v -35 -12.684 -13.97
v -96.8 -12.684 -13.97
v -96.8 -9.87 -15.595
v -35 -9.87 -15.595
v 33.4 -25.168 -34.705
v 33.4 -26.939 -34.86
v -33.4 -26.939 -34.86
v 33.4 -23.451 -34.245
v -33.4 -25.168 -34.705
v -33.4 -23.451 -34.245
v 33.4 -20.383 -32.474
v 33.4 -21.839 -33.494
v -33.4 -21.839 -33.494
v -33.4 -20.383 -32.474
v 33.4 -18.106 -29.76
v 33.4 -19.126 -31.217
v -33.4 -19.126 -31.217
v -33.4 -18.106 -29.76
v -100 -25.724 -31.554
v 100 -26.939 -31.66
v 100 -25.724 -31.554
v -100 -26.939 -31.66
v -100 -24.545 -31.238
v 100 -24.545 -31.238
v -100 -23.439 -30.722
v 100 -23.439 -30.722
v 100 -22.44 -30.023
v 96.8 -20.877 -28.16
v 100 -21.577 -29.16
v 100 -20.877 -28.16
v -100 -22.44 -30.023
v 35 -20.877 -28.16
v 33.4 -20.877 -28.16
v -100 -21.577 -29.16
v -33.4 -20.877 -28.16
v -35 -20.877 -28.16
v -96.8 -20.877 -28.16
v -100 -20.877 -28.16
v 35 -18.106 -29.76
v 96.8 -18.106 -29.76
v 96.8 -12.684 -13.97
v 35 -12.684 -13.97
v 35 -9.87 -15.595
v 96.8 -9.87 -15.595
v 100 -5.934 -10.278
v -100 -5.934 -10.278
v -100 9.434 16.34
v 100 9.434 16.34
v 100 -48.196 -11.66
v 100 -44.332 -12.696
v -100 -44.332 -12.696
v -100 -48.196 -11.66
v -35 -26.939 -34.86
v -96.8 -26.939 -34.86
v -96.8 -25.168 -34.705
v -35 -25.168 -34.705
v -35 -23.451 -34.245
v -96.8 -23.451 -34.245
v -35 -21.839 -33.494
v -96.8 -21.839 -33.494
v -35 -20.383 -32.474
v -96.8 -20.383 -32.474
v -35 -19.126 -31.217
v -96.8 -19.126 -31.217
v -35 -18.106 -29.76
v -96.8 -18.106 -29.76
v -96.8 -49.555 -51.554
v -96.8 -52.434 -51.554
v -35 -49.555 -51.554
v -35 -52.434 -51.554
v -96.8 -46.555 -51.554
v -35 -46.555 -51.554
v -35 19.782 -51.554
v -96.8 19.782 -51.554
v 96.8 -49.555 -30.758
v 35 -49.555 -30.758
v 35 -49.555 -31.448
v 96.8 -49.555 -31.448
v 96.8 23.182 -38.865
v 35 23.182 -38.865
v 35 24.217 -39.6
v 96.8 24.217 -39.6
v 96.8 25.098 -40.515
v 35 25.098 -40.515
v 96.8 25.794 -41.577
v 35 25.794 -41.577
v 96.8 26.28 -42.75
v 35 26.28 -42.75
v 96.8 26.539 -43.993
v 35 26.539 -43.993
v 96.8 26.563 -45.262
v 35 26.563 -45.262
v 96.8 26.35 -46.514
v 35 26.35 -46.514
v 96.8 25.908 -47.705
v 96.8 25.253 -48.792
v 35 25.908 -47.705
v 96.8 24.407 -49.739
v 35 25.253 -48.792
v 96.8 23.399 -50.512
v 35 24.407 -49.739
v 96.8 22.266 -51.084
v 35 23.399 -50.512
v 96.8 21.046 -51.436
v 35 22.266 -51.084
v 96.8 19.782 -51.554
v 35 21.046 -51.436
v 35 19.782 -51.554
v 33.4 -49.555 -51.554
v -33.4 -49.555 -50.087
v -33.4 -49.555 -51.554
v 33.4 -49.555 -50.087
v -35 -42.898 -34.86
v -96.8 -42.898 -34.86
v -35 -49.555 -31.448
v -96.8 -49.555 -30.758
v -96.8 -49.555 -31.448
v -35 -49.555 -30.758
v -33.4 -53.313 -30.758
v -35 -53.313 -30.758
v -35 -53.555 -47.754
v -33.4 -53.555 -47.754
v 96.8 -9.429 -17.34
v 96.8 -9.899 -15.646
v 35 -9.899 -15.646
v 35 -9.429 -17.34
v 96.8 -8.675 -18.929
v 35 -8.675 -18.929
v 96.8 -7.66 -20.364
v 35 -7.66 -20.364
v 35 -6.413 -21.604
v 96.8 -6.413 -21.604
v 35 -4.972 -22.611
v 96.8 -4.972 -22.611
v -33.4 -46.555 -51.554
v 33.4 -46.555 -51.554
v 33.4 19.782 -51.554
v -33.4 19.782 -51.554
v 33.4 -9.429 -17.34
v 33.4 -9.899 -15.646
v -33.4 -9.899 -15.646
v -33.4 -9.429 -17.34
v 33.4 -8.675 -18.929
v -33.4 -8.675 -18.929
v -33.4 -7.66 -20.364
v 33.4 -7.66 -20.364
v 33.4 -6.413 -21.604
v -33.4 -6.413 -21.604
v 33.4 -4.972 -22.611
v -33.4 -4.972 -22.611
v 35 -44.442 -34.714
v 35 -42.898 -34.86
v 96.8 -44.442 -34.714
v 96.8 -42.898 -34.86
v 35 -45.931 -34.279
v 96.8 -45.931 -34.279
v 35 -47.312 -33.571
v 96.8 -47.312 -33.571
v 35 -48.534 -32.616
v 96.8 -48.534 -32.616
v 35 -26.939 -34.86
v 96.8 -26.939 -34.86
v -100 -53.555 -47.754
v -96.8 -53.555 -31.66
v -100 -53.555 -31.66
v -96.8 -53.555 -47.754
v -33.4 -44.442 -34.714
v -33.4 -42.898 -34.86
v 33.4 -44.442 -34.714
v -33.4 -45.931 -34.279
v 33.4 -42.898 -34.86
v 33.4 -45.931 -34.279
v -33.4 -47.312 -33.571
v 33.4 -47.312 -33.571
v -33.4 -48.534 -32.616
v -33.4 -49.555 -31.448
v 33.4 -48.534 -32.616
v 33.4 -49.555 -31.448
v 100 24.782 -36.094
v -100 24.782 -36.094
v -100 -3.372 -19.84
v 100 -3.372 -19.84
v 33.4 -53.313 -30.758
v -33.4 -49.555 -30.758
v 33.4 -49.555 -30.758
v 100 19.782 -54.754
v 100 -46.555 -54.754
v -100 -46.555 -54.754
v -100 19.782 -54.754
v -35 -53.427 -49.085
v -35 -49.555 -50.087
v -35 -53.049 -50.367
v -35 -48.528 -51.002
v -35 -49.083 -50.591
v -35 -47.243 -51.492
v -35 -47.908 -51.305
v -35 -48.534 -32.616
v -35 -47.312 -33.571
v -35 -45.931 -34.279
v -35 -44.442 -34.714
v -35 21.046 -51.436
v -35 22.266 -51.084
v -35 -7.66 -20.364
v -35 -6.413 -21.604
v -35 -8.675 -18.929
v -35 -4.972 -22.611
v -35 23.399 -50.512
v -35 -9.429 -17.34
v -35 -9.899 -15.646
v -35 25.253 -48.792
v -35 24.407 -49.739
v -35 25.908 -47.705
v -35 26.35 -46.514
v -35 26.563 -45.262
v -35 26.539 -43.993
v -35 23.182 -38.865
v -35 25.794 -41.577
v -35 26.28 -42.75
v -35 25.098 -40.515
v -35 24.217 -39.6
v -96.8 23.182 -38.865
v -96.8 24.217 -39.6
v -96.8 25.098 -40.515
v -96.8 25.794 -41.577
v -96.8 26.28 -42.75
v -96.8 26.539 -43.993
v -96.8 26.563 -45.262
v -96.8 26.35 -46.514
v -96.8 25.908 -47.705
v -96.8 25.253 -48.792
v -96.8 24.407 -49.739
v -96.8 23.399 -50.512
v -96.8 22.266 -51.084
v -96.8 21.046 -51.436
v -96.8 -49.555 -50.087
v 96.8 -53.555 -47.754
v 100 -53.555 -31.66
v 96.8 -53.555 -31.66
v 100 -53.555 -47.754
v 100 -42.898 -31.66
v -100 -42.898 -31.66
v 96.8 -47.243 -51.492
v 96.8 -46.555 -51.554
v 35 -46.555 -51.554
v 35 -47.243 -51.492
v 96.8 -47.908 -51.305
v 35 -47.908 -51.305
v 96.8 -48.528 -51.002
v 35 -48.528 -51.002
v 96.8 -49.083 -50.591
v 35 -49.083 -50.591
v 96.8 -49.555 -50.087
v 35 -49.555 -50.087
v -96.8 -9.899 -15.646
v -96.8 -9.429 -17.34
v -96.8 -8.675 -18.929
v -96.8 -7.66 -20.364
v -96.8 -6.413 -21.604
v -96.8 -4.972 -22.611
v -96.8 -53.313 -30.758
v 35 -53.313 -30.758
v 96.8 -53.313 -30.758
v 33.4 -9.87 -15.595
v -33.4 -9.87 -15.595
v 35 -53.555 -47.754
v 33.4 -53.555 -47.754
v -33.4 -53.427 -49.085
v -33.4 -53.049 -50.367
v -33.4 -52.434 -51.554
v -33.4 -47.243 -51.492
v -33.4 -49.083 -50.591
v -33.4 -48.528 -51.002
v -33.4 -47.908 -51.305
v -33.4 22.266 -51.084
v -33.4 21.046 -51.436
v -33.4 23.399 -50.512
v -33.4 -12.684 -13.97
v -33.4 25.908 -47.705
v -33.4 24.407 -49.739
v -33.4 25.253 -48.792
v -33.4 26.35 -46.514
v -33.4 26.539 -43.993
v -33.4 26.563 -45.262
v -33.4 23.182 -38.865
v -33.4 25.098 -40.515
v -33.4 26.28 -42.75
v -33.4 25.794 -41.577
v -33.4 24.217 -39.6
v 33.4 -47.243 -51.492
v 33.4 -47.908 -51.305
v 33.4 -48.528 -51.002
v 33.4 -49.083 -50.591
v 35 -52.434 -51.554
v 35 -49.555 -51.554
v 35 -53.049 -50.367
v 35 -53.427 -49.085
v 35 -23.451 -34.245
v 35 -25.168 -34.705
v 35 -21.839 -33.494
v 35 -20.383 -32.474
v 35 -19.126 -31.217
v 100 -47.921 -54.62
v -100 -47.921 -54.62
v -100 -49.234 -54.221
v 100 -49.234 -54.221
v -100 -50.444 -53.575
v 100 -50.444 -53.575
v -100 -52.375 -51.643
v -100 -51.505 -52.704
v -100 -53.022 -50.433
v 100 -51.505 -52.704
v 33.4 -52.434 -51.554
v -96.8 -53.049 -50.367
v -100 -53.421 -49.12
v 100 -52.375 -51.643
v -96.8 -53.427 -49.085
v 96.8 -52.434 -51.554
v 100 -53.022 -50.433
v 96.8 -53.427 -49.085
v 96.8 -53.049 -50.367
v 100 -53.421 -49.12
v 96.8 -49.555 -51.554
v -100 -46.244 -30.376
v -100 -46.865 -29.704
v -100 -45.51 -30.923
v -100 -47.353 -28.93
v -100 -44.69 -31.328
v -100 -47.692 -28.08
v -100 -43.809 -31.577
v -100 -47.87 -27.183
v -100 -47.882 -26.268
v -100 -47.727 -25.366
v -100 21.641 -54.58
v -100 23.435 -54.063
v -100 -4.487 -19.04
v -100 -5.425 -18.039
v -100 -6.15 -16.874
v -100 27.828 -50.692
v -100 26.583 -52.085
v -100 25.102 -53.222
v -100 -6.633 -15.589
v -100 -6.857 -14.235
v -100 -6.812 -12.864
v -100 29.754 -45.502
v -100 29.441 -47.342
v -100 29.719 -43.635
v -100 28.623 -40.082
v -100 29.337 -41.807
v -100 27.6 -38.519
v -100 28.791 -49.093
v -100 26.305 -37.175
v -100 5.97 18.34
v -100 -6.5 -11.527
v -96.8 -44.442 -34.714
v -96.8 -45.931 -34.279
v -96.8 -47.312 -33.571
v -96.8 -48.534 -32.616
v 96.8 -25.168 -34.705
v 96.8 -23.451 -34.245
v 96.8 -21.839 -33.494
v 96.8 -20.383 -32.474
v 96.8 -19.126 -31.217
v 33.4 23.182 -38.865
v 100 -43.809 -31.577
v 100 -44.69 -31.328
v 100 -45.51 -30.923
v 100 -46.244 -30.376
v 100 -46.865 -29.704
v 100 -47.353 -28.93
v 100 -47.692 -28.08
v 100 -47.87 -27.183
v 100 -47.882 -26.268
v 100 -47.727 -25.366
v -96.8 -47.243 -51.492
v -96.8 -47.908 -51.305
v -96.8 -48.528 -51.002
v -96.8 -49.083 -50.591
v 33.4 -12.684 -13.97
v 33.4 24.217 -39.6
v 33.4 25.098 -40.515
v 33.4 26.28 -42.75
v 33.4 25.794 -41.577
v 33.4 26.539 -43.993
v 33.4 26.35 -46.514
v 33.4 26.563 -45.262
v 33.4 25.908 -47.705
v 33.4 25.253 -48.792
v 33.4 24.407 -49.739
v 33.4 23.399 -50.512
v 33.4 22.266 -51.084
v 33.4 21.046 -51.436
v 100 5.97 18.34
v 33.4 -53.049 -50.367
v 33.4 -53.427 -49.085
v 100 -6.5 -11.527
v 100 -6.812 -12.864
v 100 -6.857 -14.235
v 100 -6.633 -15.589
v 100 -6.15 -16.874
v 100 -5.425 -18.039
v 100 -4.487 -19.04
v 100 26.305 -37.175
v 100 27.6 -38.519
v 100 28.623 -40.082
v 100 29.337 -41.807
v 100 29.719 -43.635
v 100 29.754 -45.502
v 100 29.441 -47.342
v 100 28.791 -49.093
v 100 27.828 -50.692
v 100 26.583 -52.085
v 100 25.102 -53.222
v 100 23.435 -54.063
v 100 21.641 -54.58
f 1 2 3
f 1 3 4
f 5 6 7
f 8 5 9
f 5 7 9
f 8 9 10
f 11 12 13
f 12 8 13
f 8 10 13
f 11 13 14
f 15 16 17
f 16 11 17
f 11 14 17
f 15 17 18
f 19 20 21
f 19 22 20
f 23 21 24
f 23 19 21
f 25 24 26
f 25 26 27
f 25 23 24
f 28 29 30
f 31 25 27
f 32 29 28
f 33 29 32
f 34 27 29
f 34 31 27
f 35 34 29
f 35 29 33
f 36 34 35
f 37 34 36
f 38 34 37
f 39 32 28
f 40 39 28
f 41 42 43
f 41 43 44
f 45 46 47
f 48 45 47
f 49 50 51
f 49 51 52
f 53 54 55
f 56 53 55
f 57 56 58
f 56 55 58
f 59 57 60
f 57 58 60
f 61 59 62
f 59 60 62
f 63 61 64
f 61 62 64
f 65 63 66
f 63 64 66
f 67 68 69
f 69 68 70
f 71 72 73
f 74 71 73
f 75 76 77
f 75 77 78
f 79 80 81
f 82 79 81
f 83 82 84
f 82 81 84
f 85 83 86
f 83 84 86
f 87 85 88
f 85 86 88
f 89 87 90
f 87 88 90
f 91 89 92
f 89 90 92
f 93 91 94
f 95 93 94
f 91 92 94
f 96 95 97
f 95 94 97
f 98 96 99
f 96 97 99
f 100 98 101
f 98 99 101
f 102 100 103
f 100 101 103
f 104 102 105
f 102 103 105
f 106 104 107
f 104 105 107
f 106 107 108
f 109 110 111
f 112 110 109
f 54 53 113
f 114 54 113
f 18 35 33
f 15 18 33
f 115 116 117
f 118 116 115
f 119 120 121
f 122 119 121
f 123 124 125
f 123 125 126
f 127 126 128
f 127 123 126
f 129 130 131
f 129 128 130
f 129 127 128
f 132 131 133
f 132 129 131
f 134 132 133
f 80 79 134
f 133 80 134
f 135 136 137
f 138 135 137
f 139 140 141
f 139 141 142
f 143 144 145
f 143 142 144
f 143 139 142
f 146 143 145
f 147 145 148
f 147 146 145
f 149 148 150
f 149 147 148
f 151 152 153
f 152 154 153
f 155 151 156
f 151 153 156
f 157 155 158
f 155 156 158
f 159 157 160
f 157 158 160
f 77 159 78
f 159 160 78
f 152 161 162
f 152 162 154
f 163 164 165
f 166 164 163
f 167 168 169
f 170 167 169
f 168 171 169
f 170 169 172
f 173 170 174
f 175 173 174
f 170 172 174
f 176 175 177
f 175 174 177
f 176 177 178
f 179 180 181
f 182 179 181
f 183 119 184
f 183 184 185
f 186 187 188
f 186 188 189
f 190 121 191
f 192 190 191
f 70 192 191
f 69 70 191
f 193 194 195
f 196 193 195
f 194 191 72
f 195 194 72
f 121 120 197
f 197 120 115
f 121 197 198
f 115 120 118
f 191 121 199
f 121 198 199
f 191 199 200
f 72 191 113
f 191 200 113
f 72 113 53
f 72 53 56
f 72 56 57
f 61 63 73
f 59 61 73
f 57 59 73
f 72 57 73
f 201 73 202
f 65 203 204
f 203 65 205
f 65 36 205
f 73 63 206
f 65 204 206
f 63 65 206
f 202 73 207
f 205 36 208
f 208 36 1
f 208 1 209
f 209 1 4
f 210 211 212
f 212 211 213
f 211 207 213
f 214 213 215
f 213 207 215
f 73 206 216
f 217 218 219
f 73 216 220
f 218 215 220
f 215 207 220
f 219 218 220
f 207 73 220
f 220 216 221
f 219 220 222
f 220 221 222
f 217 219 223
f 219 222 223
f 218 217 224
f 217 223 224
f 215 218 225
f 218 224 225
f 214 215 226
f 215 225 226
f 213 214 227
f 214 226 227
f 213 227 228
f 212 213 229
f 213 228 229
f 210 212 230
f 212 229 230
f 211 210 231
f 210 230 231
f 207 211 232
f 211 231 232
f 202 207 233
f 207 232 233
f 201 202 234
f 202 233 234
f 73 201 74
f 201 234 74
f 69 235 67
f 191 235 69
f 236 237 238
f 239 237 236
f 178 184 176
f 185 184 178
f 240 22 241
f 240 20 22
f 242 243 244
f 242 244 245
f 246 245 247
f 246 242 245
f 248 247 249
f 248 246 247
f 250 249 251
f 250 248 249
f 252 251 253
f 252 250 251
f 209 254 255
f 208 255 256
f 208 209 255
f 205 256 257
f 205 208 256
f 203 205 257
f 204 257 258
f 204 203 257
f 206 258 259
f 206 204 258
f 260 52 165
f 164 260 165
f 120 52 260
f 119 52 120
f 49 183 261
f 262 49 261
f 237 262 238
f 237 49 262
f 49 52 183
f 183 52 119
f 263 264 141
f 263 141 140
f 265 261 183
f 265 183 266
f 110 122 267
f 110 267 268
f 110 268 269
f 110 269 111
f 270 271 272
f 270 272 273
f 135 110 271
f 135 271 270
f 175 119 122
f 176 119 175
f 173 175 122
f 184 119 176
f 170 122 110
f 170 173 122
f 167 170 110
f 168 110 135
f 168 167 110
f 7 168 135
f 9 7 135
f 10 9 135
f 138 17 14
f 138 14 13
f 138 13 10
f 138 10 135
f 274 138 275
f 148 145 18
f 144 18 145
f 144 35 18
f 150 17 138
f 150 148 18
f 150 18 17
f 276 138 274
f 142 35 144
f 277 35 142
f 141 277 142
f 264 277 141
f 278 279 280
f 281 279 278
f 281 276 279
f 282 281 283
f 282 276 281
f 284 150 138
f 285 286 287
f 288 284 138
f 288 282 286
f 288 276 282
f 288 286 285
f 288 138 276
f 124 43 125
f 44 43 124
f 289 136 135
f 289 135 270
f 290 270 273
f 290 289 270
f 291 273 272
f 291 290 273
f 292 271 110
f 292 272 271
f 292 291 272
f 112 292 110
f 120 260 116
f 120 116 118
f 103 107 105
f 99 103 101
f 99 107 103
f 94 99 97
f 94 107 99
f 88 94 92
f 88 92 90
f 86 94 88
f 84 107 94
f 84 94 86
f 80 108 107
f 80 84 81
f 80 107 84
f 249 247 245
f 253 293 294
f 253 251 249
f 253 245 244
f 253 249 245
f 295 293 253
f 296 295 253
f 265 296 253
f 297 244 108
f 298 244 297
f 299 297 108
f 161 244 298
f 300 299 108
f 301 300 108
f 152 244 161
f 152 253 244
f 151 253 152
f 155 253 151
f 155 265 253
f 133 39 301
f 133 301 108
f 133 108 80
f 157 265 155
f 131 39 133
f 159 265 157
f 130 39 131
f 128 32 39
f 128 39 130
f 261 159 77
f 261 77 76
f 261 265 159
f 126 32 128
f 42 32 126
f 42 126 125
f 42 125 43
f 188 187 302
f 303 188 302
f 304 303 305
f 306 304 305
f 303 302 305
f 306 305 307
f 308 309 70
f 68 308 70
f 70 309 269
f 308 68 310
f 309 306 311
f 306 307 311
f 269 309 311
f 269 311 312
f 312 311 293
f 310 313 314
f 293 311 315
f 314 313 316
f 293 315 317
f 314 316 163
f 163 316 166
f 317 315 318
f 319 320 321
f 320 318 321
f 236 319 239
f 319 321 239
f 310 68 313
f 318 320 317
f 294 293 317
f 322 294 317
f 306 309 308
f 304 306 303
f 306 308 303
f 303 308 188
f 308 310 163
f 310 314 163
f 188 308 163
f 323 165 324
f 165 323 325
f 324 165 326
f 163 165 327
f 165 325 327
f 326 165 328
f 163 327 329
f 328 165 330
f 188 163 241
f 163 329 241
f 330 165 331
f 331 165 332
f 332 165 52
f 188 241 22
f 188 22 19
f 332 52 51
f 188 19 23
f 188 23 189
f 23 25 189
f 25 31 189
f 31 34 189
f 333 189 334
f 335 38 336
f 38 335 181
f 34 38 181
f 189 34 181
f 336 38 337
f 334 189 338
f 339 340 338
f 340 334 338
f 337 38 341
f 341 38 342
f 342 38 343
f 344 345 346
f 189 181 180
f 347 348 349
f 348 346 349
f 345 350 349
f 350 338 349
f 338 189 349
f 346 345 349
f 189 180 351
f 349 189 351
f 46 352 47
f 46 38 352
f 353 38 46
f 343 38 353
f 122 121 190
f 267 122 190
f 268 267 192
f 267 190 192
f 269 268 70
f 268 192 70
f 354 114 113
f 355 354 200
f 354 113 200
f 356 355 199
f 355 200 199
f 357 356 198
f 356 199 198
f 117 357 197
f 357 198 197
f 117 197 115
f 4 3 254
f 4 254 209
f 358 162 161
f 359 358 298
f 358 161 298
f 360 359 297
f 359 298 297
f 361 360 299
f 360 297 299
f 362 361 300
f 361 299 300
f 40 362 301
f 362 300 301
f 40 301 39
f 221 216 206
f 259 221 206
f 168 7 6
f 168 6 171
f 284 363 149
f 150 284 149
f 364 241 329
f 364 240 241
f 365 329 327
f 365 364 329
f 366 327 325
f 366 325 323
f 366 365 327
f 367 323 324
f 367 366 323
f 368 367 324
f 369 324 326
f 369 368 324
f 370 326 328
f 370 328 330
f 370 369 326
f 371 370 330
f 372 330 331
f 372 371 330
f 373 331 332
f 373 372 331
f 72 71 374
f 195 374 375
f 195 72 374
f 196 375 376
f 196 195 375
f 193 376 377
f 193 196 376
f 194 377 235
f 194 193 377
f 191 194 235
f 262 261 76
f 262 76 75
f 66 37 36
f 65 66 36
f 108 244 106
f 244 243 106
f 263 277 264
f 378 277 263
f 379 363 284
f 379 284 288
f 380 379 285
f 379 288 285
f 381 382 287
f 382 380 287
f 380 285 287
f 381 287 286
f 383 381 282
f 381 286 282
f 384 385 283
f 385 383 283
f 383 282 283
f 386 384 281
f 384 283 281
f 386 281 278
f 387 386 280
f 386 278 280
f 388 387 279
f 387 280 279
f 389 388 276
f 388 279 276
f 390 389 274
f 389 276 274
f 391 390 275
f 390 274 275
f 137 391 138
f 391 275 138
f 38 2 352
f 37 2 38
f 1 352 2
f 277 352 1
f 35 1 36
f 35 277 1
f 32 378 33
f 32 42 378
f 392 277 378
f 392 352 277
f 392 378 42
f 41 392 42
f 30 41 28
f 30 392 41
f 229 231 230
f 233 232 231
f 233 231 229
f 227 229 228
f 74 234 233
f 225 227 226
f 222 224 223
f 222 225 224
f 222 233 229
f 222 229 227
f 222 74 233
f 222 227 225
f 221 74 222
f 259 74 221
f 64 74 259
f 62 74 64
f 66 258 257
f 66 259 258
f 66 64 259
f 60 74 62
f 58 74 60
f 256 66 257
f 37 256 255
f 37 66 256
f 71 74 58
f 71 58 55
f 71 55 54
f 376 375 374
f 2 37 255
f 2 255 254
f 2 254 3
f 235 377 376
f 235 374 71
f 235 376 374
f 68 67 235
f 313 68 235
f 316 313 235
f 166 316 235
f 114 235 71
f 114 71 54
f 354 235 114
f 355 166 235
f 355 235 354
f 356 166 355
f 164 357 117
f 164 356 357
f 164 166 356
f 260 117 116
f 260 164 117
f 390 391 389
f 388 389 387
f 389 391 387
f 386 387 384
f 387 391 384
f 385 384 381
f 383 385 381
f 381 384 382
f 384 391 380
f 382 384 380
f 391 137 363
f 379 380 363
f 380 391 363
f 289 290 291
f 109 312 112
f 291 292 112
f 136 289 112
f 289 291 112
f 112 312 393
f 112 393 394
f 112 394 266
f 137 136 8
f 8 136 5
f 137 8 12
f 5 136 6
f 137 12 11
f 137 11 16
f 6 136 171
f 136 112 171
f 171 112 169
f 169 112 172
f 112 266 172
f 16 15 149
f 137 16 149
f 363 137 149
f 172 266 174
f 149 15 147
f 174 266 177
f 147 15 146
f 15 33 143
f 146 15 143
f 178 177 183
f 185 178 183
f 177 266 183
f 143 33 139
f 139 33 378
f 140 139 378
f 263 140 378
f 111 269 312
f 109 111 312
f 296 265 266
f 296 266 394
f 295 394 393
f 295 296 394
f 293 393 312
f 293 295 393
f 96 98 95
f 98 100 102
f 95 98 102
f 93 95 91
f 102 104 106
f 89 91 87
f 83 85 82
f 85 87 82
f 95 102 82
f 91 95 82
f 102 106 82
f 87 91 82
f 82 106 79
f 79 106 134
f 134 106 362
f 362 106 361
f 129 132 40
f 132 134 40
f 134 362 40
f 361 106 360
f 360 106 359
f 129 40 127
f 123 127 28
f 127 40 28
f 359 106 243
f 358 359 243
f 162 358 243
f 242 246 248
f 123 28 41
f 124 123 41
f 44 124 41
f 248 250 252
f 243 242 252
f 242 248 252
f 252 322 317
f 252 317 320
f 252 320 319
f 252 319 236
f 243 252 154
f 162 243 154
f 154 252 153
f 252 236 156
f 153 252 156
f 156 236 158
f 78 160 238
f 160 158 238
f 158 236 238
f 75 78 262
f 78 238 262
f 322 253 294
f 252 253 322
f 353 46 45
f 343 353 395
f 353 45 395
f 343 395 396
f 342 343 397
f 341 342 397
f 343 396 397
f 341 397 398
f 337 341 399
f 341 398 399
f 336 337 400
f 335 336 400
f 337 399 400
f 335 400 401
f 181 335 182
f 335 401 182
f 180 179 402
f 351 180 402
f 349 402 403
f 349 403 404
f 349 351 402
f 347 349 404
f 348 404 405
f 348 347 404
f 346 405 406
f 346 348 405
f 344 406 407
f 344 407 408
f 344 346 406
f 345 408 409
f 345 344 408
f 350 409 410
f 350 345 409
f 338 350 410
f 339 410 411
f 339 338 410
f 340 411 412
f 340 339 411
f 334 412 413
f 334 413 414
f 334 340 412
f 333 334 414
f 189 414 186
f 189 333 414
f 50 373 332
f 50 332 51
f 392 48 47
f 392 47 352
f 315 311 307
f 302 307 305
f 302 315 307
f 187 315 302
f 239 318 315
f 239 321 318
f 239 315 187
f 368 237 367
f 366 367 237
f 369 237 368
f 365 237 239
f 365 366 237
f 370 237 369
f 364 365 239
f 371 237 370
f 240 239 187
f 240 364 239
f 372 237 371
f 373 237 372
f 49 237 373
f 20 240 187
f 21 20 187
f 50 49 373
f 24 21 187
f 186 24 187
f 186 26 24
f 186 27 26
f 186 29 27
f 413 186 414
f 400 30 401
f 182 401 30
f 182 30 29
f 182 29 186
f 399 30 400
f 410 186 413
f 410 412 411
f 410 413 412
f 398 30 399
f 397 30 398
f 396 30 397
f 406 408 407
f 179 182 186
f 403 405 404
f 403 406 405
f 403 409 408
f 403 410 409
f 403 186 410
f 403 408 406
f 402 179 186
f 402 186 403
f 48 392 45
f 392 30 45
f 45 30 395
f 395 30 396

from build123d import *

# Parameters (mm, degrees)
F1_DEPTH    = 100
F2_R        = 7
F3_T1_DEPTH = 386.6025403784
F4_T        = -3.2
F5_W        = 193.6
F5_H        = 20.7961232061
F6_DEPTH    = 4
F9_DEPTH    = 1.6
F10_W       = 61.8
F10_H       = 16.3858774256
F10_W_2     = 66.8
F11_DEPTH   = 3.25


# Not quite as in the source:
# - a fillet or chamfer that OpenCascade refuses, or shapes differently, is made with other operations: its cross-section is extruded or revolved along the edge and cut away or added
# - a pattern or mirror of a feature is missing from the dataset's text; its kind, count and spacing are read off the source's solid


with BuildPart() as f1:
    # F0 (on Right) → F1 (new body, symmetric)
    with BuildSketch(Plane.YZ):
        with BuildLine():
            ThreePointArc((-42.8978583449, -31.6602540378), (-46.8646250463, -29.7040611829), (-47.7274874763, -25.3661588123))
            Line((-47.7274874763, -25.3661588123), (-44.3324027769, -12.6955302183))
            Line((-44.3324027769, -12.6955302183), (-48.1961060821, -11.6602540378))
            Line((-48.1961060821, -11.6602540378), (-53.5550899307, -31.6602540378))
            Line((-53.5550899307, -31.6602540378), (-53.5550899307, -54.7542648054))
            Line((-53.5550899307, -54.7542648054), (57.1021416551, -54.7542648054))
            Line((57.1021416551, -54.7542648054), (-9.4337567297, -16.3397459622))
            Line((-9.4337567297, -16.3397459622), (9.4337567297, 16.3397459622))
            Line((9.4337567297, 16.3397459622), (5.9696551146, 18.3397459622))
            Line((5.9696551146, 18.3397459622), (-22.8978583449, -31.6602540378))
            Line((-22.8978583449, -31.6602540378), (-42.8978583449, -31.6602540378))
        make_face()
    extrude(amount=F1_DEPTH, both=True)

    # F2
    f2_edges = [f1.edges().sort_by_distance(p)[0] for p in [
        (0, -53.55509, -54.754265),
        (0, -9.433757, -16.339746),
        (0, -22.897858, -31.660254),
    ]]
    fillet(f2_edges, radius=F2_R)

    # F3: fillet of radius 10 on 1 edges, made by hand

    # F3_s2 → F3_t1 (cut)
    with BuildSketch(Plane.YZ.offset(-193.3012701892)):
        with BuildLine():
            ThreePointArc((24.7816335794, -36.0940107676), (29.4408918423, -47.3424552565), (19.7816335794, -54.7542648054))
            Line((19.7816335794, -54.7542648054), (57.1021416551, -54.7542648054))
            Line((57.1021416551, -54.7542648054), (24.7816335794, -36.0940107676))
        make_face()
    extrude(amount=F3_T1_DEPTH, mode=Mode.SUBTRACT)

    # F4 (hollow: no face is removed)
    offset(amount=F4_T, mode=Mode.SUBTRACT)

    # F5 (on face) → F6 (cut)
    with BuildSketch(Plane.XZ.offset(53.5550899307)):
        with Locations((0, -41.1562032024)):
            Rectangle(F5_W, F5_H)
    extrude(amount=-F6_DEPTH, mode=Mode.SUBTRACT)

    # F8 (on offset) → F9 (join)
    with BuildSketch(Plane.YZ.offset(35)):
        with BuildLine():
            Line((-49.5550899307, -31.4478701056), (-49.5550899307, -30.7581415993))
            Line((-49.5550899307, -30.7581415993), (-53.3133696313, -30.7581415993))
            Line((-53.3133696313, -30.7581415993), (-53.5550899307, -47.7542648054))
            ThreePointArc((-53.5550899307, -47.7542648054), (-53.2689348678, -49.735245916), (-52.4338653134, -51.5542648054))
            Line((-52.4338653134, -51.5542648054), (-46.5550899307, -51.5542648054))
            Line((-46.5550899307, -51.5542648054), (19.7816335794, -51.5542648054))
            ThreePointArc((19.7816335794, -51.5542648054), (26.3499291982, -46.5142343121), (23.1816335794, -38.8652920597))
            Line((23.1816335794, -38.8652920597), (-4.9715789032, -22.6110272543))
            ThreePointArc((-4.9715789032, -22.6110272543), (-8.2208411642, -19.6367335794), (-9.9129123978, -15.569667924))
            Line((-9.9129123978, -15.569667924), (-18.1058511106, -29.7602540378))
            ThreePointArc((-18.1058511106, -29.7602540378), (-21.8393102292, -33.4937131564), (-26.9393102292, -34.8602540378))
            Line((-26.9393102292, -34.8602540378), (-42.8978583449, -34.8602540378))
            ThreePointArc((-42.8978583449, -34.8602540378), (-46.6382826687, -33.9574607553), (-49.5550899307, -31.4478701056))
        make_face()
    f9 = extrude(amount=-F9_DEPTH)

    # F9_copies: F9 across plane
    add(f9.mirror(Plane(origin=(0, 0, 0), x_dir=(0, 0, -1), z_dir=(-1, 0, 0))))

    # F10 (on face) → F11 (cut)
    with BuildSketch(Plane(origin=(0, -3.4641016151, 2), x_dir=(1, 0, 0), z_dir=(0, -0.8660254038, 0.5))):
        with Locations((-65.9, -26.6331228623)):
            Rectangle(F10_W, F10_H)
        with Locations((0, -26.6331228623)):
            Rectangle(F10_W_2, F10_H)
        with Locations((65.9, -26.6331228623)):
            Rectangle(F10_W, F10_H)
    extrude(amount=-F11_DEPTH, mode=Mode.SUBTRACT)


solid = f1.part
